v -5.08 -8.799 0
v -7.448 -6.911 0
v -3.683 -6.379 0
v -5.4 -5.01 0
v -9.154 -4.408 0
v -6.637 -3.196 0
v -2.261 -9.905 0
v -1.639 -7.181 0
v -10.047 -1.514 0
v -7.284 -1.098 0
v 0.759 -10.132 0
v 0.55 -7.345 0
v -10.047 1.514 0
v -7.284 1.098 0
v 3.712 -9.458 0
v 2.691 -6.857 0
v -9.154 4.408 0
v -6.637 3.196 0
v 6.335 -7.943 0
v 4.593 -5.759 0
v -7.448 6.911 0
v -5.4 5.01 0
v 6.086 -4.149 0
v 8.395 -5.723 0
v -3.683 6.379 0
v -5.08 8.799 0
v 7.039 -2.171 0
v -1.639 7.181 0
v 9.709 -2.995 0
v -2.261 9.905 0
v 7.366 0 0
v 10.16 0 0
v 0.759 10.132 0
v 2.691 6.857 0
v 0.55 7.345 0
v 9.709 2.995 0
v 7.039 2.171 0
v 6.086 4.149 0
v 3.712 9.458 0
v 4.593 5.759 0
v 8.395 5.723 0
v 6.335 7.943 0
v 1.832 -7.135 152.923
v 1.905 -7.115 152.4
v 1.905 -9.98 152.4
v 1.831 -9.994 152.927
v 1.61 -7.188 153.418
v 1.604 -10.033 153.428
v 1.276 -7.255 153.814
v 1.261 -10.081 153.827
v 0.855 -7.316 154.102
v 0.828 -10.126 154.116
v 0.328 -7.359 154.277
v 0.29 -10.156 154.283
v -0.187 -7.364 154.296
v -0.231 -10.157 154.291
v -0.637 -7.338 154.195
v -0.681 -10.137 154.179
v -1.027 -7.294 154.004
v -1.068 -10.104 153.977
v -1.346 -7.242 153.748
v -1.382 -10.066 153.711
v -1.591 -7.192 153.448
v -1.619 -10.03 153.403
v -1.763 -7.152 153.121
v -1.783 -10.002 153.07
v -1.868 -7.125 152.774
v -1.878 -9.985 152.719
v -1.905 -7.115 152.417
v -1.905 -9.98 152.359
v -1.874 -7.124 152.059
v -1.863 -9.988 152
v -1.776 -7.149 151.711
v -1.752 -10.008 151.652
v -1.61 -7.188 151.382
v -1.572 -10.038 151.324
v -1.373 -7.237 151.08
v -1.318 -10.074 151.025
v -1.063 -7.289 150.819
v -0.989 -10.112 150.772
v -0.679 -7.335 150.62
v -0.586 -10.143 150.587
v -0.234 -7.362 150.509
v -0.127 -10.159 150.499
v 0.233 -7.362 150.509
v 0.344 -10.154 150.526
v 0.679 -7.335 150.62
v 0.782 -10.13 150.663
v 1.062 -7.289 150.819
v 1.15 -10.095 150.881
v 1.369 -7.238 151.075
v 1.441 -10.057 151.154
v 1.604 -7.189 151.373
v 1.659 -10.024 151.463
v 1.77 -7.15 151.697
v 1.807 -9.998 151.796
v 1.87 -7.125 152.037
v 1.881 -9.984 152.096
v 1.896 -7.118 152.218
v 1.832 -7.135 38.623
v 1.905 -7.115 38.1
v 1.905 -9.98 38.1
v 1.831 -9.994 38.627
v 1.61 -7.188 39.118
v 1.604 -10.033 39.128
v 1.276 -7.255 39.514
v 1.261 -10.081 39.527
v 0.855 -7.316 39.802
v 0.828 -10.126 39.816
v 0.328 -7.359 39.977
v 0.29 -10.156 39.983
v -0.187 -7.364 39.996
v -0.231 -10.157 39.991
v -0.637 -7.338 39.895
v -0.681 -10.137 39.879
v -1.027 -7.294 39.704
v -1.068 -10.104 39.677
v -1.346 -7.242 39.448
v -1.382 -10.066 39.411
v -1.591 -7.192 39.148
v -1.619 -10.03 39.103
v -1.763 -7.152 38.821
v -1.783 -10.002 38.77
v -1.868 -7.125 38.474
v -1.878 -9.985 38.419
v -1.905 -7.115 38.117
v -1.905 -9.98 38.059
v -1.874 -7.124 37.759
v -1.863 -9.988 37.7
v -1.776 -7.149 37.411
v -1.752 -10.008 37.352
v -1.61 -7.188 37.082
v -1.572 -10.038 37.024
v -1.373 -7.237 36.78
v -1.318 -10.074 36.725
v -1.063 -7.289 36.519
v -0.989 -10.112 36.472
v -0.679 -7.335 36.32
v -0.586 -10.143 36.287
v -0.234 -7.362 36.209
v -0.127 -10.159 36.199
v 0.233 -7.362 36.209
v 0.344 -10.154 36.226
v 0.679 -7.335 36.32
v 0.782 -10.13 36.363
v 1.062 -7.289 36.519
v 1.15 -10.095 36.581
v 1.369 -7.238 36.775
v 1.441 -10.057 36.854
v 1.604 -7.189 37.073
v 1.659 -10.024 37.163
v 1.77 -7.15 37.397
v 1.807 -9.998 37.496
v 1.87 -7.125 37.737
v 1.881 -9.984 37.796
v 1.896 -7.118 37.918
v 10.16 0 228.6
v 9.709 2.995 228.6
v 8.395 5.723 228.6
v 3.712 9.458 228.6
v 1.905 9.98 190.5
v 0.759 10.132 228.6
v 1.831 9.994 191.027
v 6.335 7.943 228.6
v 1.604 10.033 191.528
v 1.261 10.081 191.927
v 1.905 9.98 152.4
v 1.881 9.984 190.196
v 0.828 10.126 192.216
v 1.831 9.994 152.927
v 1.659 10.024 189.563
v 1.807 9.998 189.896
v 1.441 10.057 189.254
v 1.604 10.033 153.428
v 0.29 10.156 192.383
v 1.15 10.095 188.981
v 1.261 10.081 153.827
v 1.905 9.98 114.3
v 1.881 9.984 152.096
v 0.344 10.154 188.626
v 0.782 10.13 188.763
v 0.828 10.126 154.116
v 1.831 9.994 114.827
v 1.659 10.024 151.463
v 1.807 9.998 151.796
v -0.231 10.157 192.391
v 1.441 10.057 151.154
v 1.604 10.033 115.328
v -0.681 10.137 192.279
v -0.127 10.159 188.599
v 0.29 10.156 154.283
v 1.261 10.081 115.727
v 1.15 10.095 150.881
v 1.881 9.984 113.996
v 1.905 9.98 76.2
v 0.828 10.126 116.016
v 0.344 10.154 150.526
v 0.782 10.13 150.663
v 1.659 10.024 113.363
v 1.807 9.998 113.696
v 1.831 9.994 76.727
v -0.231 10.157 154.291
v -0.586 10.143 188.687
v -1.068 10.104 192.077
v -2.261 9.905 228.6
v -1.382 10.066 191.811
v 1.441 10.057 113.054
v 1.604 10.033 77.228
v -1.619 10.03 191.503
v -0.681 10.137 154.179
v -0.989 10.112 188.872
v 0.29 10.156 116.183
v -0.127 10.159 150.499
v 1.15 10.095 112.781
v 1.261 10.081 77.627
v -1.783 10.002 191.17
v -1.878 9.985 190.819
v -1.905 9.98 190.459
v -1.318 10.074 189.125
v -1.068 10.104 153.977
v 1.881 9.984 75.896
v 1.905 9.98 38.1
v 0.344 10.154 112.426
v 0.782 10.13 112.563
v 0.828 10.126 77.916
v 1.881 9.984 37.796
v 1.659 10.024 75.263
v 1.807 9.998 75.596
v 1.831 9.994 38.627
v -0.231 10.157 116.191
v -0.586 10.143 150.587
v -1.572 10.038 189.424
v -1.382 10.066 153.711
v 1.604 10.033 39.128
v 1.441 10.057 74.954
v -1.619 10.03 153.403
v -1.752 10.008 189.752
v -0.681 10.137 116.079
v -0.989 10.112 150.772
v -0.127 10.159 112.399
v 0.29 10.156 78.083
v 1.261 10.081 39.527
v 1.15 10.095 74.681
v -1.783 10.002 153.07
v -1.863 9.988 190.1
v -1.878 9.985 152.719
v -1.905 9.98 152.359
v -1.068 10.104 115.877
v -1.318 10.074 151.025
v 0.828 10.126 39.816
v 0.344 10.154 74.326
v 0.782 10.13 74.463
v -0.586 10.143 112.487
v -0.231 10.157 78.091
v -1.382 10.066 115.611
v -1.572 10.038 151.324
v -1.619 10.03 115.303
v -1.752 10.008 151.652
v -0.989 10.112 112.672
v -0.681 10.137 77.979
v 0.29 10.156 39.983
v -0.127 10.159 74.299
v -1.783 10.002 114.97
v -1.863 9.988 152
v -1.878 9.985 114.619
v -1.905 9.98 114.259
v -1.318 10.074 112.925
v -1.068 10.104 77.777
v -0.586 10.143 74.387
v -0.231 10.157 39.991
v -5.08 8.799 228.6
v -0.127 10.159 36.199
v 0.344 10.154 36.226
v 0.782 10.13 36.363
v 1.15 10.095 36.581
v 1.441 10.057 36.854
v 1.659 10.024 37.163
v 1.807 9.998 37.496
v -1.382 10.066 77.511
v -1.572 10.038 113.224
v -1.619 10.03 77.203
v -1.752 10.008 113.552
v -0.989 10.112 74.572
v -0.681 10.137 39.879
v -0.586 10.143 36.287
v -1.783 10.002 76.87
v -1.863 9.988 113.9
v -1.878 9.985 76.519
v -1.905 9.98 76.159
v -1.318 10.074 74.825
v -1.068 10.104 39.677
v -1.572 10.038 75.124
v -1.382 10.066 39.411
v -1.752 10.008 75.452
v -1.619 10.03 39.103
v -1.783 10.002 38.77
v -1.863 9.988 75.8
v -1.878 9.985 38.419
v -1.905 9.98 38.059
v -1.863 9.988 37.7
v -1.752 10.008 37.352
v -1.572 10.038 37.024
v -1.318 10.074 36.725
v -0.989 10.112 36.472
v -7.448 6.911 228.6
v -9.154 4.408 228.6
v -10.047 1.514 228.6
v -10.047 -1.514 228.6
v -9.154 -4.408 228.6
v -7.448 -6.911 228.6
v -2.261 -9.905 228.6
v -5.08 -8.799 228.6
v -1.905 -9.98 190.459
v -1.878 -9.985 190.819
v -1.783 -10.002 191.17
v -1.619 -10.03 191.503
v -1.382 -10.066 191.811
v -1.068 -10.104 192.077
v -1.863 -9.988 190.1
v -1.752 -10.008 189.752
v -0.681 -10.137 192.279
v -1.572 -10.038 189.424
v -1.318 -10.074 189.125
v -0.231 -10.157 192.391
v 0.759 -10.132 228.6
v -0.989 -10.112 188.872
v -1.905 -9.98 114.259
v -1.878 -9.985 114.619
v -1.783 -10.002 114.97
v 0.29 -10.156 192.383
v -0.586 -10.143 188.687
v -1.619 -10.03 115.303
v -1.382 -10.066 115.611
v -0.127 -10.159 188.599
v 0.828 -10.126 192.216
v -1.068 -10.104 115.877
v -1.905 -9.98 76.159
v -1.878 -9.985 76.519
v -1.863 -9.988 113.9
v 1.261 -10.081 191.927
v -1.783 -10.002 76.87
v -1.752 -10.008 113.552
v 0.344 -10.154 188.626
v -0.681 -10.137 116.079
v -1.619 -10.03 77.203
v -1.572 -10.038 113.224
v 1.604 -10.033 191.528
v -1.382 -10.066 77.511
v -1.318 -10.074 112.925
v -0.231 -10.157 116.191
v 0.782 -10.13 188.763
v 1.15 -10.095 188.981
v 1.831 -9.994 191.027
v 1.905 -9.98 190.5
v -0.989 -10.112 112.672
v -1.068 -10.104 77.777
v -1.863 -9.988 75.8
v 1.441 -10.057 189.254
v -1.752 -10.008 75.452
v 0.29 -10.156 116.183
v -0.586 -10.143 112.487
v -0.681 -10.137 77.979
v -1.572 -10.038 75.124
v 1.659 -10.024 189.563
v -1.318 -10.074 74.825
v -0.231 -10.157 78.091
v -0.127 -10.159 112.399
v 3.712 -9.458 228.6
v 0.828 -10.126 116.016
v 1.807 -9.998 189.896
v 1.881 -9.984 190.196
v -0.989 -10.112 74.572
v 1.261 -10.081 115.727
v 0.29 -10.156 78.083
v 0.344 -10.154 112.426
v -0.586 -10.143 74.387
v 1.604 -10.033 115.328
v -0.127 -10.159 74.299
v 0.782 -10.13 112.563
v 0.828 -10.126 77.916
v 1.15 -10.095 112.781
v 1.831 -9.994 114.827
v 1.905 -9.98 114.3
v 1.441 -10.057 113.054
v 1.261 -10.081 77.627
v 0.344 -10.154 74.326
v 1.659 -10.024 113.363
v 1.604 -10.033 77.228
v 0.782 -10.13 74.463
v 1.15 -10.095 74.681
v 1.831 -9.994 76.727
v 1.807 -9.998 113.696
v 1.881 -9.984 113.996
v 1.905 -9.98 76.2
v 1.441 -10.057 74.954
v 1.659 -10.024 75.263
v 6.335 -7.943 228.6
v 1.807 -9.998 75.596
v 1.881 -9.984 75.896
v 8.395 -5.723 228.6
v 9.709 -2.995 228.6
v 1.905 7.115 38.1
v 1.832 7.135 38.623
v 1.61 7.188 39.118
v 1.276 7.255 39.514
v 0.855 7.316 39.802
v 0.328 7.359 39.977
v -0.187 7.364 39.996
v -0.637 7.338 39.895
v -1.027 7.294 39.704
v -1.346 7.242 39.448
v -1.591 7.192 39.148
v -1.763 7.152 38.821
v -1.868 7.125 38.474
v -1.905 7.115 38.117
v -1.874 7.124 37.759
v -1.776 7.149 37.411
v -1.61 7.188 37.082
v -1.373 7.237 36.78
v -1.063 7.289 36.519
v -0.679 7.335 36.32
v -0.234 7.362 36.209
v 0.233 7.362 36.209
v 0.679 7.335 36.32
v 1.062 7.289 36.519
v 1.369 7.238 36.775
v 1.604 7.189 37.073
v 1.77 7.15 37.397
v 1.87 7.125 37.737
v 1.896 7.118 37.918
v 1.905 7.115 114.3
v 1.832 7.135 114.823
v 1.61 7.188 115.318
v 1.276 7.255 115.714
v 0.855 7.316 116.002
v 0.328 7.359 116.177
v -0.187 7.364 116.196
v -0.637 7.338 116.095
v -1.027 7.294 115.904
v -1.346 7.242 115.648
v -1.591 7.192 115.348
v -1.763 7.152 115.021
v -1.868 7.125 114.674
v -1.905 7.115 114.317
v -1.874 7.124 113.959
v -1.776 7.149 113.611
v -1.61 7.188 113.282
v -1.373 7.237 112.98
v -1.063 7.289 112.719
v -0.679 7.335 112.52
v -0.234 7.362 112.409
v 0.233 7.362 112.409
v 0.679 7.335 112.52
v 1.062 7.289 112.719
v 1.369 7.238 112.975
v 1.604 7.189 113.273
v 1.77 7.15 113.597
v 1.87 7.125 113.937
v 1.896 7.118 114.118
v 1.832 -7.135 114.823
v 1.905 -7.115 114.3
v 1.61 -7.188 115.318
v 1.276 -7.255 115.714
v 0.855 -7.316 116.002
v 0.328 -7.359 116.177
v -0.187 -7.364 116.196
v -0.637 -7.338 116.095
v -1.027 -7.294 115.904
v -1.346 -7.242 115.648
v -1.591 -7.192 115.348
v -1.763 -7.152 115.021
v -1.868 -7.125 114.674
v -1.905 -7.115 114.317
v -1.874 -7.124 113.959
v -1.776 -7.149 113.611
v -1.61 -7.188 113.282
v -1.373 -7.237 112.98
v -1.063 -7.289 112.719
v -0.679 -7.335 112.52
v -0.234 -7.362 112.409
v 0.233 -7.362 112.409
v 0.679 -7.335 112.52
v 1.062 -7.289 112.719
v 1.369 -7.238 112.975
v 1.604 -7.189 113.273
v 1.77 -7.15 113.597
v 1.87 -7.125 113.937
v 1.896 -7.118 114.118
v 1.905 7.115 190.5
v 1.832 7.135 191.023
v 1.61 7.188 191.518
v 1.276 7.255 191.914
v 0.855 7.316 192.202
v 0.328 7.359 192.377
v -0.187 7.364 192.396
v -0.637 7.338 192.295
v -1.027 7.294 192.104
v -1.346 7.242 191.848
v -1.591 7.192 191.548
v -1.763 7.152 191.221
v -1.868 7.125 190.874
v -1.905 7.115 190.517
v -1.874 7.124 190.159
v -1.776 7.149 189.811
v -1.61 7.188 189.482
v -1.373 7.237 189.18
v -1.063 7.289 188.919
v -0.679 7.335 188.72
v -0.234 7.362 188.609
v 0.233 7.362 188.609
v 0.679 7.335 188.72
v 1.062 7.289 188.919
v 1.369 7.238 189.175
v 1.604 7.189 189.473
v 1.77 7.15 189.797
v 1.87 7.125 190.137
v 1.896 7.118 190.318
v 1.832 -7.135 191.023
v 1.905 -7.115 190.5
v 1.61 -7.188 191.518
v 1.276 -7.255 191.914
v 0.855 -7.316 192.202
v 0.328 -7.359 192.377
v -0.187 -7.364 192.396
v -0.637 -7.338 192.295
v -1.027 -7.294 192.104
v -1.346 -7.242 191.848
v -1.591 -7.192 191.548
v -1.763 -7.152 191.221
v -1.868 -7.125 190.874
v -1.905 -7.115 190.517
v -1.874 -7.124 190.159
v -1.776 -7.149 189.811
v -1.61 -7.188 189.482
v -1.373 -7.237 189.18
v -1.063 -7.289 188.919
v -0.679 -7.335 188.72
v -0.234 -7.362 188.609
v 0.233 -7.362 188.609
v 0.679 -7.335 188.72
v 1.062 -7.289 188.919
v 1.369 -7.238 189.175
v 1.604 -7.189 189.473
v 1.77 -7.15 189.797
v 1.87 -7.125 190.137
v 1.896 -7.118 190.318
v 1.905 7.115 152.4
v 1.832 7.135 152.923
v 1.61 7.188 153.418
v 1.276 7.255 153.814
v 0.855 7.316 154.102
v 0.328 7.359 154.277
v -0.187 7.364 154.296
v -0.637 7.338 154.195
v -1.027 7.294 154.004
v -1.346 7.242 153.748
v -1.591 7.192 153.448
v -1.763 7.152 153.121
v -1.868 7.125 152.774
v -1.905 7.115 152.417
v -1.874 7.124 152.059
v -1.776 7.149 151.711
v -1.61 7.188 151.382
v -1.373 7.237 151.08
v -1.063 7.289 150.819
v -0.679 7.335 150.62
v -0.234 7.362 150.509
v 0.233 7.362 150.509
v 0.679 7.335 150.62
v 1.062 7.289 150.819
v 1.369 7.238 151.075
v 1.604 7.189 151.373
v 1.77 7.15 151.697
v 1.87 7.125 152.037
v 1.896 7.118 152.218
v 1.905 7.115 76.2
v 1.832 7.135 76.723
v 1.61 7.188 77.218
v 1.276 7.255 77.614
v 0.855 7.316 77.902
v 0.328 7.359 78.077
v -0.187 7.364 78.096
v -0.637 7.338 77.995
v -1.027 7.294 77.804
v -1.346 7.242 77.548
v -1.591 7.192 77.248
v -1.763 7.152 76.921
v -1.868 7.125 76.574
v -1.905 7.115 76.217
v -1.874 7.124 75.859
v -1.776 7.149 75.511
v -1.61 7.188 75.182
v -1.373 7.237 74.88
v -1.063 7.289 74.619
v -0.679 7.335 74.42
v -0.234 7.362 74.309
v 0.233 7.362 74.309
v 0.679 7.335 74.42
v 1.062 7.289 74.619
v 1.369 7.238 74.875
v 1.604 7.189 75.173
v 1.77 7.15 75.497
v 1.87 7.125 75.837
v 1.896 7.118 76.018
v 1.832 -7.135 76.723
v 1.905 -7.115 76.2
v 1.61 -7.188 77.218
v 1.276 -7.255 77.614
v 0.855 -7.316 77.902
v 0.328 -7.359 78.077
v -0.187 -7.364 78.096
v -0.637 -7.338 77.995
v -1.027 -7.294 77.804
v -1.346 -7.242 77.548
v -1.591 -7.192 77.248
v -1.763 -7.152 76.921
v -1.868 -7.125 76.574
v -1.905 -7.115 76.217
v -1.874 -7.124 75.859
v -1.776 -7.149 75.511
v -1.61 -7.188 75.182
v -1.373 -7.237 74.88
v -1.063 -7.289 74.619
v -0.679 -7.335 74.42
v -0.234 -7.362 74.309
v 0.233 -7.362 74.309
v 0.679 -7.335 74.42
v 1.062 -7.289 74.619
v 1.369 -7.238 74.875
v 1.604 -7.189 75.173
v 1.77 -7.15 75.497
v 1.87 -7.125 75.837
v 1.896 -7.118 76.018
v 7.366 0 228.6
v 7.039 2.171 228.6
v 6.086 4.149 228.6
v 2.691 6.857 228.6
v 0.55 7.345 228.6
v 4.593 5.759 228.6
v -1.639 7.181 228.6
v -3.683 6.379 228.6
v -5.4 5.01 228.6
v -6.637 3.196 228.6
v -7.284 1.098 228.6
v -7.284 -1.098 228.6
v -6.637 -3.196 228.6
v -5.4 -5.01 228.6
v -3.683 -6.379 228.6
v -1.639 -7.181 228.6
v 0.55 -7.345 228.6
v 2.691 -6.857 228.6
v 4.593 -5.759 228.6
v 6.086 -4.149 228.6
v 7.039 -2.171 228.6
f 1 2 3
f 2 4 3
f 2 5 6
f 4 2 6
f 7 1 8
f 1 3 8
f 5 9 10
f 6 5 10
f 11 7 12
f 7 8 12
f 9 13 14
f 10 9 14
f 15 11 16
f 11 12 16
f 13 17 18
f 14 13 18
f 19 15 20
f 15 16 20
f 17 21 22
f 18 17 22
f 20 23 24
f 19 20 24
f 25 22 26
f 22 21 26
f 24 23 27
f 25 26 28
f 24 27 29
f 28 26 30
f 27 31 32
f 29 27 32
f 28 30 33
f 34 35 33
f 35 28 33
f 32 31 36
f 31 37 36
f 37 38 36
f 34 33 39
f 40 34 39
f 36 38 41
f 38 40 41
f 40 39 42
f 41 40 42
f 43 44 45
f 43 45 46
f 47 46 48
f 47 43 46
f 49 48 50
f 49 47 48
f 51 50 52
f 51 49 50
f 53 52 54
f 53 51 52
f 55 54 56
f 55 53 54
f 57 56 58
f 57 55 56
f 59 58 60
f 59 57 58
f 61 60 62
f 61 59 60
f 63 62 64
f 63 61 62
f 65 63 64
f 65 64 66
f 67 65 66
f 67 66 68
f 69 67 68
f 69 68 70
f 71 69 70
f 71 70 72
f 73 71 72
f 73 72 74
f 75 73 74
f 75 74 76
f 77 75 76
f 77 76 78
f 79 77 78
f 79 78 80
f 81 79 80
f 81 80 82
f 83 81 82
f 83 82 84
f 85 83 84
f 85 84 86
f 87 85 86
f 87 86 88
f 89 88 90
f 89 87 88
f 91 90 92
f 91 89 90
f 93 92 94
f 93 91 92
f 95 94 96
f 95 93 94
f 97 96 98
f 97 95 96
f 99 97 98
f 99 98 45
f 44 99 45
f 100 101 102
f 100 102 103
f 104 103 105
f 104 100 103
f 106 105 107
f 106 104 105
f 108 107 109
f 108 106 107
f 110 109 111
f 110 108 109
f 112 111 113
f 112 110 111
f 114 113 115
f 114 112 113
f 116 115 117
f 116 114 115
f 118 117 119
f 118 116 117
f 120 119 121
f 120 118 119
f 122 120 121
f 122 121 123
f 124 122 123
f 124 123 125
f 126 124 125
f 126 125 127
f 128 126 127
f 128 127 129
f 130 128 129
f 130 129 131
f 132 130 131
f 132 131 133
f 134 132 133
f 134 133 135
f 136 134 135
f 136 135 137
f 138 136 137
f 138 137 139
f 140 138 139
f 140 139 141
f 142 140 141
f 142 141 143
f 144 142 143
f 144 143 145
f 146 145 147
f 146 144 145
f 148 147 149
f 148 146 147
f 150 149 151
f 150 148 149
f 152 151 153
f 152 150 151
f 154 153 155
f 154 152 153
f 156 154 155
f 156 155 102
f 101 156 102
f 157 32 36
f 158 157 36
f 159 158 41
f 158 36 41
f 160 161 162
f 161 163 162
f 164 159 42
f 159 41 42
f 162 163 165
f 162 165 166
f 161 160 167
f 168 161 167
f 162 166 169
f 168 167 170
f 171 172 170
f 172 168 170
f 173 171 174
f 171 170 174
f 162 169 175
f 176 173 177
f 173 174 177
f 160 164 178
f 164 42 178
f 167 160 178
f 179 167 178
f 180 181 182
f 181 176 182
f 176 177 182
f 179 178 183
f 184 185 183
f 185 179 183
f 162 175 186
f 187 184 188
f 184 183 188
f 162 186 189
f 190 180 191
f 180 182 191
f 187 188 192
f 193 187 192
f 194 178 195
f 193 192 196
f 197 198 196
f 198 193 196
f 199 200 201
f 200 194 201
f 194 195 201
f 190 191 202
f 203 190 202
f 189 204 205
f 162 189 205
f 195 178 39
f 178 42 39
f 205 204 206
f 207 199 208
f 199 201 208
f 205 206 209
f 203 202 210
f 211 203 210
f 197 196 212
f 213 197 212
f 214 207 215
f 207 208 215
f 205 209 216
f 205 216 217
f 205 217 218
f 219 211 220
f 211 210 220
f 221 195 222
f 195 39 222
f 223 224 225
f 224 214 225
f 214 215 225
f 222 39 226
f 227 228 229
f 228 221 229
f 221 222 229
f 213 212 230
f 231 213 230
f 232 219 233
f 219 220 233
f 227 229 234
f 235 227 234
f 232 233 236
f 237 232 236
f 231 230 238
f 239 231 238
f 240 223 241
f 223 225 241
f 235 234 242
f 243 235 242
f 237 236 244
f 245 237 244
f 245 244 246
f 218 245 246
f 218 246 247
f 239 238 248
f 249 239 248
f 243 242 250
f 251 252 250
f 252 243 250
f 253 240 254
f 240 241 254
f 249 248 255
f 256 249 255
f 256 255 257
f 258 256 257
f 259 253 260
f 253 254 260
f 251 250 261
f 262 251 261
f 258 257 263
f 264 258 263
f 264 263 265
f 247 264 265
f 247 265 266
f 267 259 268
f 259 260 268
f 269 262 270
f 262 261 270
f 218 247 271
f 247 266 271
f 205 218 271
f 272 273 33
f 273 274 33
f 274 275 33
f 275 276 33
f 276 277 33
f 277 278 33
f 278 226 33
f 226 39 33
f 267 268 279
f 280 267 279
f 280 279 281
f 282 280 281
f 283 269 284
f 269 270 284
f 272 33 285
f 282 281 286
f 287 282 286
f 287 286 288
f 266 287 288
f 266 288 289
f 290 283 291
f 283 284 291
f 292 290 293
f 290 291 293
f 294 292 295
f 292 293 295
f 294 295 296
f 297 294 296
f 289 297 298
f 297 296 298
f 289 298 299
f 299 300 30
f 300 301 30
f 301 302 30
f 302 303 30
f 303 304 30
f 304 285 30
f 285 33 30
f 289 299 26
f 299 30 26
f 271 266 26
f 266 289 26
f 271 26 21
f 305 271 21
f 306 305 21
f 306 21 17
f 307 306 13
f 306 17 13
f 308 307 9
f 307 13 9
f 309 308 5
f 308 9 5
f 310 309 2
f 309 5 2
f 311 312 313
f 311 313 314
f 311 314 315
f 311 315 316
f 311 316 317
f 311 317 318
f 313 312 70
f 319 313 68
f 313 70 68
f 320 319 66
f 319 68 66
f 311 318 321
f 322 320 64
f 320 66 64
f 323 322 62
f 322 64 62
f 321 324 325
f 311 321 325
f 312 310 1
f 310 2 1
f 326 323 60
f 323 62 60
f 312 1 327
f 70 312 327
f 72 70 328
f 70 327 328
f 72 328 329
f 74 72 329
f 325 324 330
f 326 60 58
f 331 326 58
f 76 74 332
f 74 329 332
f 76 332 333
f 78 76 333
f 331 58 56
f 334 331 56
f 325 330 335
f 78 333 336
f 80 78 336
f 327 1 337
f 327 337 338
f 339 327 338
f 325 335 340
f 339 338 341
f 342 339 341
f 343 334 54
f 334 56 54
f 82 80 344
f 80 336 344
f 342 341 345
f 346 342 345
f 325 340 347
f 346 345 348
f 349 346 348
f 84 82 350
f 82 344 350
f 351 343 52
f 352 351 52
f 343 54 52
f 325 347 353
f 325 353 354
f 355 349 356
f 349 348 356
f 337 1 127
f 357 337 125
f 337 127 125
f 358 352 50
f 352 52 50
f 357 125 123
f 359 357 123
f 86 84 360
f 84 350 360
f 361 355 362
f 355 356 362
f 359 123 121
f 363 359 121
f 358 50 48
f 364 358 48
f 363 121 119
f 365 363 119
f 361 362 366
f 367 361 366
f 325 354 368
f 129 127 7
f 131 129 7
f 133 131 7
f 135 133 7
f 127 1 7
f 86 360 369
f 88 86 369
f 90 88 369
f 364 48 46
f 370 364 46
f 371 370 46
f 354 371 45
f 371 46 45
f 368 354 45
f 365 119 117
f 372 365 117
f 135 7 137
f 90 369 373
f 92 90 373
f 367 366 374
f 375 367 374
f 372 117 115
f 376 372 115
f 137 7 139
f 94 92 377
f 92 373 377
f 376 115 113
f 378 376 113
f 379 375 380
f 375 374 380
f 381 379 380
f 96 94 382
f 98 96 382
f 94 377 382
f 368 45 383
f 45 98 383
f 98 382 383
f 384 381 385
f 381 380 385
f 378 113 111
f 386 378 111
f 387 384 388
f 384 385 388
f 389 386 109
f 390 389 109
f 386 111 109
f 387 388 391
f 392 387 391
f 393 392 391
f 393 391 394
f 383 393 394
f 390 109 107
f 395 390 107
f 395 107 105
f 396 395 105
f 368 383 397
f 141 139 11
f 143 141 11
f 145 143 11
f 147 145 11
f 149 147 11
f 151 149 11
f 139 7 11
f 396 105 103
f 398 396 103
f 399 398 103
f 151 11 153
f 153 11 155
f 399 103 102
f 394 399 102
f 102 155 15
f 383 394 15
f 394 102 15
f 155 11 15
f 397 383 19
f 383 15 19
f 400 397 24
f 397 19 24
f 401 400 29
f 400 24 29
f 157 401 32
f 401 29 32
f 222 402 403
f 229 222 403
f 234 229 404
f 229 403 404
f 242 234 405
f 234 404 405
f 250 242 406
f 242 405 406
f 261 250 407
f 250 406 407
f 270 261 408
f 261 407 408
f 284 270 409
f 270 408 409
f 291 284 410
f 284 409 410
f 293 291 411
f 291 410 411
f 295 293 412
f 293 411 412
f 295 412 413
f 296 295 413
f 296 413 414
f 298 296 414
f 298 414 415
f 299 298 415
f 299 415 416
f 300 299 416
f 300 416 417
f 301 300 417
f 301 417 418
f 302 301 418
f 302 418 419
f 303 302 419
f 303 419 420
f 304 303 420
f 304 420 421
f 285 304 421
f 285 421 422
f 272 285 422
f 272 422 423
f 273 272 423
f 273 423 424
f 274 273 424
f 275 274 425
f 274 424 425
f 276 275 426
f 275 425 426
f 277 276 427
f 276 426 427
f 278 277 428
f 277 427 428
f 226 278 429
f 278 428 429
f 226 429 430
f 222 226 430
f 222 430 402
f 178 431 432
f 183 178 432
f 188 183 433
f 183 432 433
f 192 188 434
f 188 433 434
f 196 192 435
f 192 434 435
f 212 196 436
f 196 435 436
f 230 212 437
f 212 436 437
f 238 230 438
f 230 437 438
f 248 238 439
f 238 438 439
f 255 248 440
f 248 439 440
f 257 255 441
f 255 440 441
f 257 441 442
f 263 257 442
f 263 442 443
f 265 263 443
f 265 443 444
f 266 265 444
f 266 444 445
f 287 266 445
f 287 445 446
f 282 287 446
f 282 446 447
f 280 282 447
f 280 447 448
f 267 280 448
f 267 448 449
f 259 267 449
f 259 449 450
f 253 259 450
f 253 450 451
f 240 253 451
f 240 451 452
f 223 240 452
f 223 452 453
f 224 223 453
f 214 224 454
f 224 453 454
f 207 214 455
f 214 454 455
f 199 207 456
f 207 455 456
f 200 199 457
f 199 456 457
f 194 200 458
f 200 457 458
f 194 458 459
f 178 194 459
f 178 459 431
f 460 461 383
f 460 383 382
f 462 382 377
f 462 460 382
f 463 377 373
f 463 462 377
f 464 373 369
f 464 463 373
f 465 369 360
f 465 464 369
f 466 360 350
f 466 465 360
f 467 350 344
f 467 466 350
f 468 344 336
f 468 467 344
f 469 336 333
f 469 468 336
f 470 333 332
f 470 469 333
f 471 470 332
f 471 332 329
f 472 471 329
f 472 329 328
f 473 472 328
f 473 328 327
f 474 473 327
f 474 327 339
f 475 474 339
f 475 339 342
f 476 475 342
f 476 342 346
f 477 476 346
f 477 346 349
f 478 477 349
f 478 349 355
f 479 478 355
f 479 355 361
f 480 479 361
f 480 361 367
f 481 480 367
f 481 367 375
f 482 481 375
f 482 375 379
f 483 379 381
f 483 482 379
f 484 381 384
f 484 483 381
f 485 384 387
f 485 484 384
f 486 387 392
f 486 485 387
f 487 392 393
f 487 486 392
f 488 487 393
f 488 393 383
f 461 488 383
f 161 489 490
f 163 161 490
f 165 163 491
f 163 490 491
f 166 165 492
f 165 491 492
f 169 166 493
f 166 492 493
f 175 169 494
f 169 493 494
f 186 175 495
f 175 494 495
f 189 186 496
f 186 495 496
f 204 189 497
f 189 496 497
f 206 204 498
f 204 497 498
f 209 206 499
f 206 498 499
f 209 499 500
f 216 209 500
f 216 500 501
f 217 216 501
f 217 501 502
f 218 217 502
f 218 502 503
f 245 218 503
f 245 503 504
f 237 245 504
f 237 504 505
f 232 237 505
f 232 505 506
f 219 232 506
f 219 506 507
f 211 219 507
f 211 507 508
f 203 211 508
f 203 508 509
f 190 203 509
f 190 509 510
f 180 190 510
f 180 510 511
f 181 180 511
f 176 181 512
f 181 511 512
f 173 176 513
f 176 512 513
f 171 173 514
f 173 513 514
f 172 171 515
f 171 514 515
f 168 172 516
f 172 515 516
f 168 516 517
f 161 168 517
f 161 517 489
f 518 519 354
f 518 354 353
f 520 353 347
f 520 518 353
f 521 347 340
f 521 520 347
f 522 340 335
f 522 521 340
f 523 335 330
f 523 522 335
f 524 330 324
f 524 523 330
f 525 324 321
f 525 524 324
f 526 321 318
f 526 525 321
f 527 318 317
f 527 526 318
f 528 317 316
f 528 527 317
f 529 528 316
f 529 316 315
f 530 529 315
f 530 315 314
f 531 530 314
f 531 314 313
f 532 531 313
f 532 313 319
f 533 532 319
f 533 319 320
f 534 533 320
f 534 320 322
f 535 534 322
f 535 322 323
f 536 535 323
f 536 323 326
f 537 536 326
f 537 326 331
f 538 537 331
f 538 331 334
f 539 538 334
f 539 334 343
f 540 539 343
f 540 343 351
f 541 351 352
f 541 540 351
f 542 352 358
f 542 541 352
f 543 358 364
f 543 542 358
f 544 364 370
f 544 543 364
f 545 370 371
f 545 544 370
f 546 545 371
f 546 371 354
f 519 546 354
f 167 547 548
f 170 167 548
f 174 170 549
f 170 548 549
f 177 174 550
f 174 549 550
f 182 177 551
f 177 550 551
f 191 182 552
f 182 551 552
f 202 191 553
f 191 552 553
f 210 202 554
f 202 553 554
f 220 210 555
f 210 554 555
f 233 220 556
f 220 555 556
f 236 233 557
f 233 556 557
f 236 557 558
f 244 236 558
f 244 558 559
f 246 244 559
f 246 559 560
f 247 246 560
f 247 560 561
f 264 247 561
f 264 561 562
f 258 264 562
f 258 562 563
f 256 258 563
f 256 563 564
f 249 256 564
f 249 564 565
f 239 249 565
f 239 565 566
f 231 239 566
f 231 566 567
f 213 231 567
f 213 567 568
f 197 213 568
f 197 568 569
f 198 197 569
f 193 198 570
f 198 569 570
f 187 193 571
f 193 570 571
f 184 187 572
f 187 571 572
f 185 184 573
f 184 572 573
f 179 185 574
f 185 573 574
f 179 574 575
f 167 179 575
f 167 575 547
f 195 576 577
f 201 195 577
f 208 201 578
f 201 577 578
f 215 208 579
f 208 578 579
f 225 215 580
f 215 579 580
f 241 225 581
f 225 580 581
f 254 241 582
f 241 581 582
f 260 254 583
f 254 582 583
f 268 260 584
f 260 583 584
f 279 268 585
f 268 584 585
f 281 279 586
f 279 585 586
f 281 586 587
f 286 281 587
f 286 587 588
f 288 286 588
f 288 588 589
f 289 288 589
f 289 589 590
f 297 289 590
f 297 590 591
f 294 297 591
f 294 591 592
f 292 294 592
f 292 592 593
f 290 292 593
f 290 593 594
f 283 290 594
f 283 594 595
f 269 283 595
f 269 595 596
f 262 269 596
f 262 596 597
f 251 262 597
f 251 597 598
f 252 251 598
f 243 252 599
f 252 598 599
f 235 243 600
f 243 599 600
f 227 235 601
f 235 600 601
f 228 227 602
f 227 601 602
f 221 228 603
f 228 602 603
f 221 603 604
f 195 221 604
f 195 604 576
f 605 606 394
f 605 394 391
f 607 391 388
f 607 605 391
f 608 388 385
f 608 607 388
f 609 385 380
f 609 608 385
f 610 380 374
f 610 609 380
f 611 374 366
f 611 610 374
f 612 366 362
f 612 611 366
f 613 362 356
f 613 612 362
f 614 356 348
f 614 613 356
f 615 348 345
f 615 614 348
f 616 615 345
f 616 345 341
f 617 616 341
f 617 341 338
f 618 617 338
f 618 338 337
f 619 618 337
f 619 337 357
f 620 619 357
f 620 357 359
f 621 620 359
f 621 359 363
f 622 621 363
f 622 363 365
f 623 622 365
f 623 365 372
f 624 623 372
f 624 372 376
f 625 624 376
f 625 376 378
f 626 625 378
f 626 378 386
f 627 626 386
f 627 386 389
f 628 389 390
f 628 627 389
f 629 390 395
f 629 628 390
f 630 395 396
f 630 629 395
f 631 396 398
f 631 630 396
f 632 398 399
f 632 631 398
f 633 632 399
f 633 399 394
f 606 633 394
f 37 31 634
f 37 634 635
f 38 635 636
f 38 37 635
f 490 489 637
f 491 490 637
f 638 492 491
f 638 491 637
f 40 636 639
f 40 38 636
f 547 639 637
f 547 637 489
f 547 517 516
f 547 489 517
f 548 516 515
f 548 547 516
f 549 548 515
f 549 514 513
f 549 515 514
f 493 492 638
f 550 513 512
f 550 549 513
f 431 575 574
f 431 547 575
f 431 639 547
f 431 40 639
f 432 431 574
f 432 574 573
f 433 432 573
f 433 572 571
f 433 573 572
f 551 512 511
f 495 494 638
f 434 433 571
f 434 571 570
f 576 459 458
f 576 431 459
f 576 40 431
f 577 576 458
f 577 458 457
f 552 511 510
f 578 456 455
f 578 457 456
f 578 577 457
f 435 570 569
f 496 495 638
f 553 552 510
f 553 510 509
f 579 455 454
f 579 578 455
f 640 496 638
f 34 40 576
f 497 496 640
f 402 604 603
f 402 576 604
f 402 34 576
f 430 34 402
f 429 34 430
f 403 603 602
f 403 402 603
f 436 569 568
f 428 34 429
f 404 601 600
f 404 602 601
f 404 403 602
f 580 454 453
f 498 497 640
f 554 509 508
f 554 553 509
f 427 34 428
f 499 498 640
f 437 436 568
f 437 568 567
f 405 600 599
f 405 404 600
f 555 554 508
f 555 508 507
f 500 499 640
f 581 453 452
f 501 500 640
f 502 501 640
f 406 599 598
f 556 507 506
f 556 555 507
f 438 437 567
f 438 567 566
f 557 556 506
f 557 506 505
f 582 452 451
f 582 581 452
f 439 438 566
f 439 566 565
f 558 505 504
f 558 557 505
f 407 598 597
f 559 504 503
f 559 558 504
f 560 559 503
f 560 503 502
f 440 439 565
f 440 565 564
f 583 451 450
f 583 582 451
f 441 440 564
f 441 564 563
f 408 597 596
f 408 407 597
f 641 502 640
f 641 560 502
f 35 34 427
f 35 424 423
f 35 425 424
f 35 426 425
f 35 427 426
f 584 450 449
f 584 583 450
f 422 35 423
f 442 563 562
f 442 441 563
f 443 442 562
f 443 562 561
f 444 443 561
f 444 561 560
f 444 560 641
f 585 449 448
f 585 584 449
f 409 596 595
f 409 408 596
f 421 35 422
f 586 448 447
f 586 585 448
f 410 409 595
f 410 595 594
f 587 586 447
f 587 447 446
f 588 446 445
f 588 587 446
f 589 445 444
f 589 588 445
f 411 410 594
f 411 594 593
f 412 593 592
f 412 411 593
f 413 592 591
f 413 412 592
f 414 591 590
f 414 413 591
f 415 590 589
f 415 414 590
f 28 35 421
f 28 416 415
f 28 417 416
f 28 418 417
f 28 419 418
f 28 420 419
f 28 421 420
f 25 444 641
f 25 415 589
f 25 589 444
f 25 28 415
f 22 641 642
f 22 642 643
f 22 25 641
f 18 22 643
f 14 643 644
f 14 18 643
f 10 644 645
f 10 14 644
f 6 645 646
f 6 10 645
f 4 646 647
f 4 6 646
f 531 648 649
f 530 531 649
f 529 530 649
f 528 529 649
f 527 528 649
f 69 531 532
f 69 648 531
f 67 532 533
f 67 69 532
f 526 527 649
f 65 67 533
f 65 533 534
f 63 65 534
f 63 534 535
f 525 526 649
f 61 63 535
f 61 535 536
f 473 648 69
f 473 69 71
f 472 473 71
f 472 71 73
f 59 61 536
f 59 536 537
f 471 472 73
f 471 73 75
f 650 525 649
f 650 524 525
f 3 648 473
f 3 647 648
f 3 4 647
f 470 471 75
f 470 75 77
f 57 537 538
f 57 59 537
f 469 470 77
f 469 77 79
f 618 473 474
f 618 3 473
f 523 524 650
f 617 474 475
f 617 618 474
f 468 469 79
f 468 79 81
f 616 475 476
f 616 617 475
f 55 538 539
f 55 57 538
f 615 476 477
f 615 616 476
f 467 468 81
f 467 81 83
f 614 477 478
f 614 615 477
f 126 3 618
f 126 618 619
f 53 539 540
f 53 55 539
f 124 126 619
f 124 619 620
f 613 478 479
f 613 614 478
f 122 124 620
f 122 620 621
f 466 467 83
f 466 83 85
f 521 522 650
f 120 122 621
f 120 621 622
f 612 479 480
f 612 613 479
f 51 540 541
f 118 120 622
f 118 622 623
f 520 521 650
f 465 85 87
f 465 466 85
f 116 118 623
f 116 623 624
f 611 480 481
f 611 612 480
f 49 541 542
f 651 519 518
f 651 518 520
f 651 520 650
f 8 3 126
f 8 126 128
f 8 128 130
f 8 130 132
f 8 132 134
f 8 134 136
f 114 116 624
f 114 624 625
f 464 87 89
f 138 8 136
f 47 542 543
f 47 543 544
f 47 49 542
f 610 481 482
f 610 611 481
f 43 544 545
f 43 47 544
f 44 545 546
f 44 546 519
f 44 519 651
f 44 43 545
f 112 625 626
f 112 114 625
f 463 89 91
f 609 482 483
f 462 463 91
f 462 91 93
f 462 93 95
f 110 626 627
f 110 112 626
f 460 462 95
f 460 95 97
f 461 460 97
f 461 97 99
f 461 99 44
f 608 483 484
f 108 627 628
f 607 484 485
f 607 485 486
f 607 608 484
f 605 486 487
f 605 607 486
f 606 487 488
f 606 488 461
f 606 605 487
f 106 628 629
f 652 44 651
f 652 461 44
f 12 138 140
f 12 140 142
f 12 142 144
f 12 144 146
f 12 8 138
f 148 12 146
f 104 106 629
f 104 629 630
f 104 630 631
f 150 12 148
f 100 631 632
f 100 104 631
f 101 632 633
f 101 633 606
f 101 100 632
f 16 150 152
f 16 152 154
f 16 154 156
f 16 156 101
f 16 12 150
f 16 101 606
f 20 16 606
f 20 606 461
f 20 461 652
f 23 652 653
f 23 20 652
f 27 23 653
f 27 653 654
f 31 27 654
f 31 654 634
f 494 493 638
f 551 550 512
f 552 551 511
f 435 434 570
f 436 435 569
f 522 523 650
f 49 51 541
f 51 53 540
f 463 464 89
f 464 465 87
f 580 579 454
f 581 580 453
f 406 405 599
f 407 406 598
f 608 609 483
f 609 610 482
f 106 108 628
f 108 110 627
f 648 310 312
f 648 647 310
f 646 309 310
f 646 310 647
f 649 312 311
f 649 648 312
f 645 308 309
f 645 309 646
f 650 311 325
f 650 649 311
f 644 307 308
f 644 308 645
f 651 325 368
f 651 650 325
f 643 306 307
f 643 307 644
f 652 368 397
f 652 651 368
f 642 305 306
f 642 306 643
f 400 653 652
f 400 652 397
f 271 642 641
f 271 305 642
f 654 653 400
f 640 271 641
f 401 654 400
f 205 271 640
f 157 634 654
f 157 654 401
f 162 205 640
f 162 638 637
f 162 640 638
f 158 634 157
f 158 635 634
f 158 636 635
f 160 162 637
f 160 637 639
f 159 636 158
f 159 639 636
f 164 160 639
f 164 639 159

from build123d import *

# Parameters (mm, degrees)
F0_R          = 10.16
F0_R_2        = 7.366
F1_DEPTH      = 228.6
F2_R          = 1.905
F3_DEPTH      = 25.4
F3_DEPTH_BACK = 25.4


with BuildPart() as f1:
    # F0 (on Top) → F1 (new body)
    with BuildSketch(Plane.XY):
        Circle(F0_R)
        Circle(F0_R_2, mode=Mode.SUBTRACT)
    extrude(amount=F1_DEPTH)

    # F2 (on Front) → F3 (cut, two sides)
    with BuildSketch(Plane.XZ) as f3_sk:
        with Locations((0, 38.1)):
            Circle(F2_R)
        with Locations((0, 76.2)):
            Circle(F2_R)
        with Locations((0, 114.3)):
            Circle(F2_R)
        with Locations((0, 152.4)):
            Circle(F2_R)
        with Locations((0, 190.5)):
            Circle(F2_R)
    extrude(amount=-F3_DEPTH, mode=Mode.SUBTRACT)
    extrude(f3_sk.sketch, amount=F3_DEPTH_BACK, mode=Mode.SUBTRACT)


solid = f1.part
